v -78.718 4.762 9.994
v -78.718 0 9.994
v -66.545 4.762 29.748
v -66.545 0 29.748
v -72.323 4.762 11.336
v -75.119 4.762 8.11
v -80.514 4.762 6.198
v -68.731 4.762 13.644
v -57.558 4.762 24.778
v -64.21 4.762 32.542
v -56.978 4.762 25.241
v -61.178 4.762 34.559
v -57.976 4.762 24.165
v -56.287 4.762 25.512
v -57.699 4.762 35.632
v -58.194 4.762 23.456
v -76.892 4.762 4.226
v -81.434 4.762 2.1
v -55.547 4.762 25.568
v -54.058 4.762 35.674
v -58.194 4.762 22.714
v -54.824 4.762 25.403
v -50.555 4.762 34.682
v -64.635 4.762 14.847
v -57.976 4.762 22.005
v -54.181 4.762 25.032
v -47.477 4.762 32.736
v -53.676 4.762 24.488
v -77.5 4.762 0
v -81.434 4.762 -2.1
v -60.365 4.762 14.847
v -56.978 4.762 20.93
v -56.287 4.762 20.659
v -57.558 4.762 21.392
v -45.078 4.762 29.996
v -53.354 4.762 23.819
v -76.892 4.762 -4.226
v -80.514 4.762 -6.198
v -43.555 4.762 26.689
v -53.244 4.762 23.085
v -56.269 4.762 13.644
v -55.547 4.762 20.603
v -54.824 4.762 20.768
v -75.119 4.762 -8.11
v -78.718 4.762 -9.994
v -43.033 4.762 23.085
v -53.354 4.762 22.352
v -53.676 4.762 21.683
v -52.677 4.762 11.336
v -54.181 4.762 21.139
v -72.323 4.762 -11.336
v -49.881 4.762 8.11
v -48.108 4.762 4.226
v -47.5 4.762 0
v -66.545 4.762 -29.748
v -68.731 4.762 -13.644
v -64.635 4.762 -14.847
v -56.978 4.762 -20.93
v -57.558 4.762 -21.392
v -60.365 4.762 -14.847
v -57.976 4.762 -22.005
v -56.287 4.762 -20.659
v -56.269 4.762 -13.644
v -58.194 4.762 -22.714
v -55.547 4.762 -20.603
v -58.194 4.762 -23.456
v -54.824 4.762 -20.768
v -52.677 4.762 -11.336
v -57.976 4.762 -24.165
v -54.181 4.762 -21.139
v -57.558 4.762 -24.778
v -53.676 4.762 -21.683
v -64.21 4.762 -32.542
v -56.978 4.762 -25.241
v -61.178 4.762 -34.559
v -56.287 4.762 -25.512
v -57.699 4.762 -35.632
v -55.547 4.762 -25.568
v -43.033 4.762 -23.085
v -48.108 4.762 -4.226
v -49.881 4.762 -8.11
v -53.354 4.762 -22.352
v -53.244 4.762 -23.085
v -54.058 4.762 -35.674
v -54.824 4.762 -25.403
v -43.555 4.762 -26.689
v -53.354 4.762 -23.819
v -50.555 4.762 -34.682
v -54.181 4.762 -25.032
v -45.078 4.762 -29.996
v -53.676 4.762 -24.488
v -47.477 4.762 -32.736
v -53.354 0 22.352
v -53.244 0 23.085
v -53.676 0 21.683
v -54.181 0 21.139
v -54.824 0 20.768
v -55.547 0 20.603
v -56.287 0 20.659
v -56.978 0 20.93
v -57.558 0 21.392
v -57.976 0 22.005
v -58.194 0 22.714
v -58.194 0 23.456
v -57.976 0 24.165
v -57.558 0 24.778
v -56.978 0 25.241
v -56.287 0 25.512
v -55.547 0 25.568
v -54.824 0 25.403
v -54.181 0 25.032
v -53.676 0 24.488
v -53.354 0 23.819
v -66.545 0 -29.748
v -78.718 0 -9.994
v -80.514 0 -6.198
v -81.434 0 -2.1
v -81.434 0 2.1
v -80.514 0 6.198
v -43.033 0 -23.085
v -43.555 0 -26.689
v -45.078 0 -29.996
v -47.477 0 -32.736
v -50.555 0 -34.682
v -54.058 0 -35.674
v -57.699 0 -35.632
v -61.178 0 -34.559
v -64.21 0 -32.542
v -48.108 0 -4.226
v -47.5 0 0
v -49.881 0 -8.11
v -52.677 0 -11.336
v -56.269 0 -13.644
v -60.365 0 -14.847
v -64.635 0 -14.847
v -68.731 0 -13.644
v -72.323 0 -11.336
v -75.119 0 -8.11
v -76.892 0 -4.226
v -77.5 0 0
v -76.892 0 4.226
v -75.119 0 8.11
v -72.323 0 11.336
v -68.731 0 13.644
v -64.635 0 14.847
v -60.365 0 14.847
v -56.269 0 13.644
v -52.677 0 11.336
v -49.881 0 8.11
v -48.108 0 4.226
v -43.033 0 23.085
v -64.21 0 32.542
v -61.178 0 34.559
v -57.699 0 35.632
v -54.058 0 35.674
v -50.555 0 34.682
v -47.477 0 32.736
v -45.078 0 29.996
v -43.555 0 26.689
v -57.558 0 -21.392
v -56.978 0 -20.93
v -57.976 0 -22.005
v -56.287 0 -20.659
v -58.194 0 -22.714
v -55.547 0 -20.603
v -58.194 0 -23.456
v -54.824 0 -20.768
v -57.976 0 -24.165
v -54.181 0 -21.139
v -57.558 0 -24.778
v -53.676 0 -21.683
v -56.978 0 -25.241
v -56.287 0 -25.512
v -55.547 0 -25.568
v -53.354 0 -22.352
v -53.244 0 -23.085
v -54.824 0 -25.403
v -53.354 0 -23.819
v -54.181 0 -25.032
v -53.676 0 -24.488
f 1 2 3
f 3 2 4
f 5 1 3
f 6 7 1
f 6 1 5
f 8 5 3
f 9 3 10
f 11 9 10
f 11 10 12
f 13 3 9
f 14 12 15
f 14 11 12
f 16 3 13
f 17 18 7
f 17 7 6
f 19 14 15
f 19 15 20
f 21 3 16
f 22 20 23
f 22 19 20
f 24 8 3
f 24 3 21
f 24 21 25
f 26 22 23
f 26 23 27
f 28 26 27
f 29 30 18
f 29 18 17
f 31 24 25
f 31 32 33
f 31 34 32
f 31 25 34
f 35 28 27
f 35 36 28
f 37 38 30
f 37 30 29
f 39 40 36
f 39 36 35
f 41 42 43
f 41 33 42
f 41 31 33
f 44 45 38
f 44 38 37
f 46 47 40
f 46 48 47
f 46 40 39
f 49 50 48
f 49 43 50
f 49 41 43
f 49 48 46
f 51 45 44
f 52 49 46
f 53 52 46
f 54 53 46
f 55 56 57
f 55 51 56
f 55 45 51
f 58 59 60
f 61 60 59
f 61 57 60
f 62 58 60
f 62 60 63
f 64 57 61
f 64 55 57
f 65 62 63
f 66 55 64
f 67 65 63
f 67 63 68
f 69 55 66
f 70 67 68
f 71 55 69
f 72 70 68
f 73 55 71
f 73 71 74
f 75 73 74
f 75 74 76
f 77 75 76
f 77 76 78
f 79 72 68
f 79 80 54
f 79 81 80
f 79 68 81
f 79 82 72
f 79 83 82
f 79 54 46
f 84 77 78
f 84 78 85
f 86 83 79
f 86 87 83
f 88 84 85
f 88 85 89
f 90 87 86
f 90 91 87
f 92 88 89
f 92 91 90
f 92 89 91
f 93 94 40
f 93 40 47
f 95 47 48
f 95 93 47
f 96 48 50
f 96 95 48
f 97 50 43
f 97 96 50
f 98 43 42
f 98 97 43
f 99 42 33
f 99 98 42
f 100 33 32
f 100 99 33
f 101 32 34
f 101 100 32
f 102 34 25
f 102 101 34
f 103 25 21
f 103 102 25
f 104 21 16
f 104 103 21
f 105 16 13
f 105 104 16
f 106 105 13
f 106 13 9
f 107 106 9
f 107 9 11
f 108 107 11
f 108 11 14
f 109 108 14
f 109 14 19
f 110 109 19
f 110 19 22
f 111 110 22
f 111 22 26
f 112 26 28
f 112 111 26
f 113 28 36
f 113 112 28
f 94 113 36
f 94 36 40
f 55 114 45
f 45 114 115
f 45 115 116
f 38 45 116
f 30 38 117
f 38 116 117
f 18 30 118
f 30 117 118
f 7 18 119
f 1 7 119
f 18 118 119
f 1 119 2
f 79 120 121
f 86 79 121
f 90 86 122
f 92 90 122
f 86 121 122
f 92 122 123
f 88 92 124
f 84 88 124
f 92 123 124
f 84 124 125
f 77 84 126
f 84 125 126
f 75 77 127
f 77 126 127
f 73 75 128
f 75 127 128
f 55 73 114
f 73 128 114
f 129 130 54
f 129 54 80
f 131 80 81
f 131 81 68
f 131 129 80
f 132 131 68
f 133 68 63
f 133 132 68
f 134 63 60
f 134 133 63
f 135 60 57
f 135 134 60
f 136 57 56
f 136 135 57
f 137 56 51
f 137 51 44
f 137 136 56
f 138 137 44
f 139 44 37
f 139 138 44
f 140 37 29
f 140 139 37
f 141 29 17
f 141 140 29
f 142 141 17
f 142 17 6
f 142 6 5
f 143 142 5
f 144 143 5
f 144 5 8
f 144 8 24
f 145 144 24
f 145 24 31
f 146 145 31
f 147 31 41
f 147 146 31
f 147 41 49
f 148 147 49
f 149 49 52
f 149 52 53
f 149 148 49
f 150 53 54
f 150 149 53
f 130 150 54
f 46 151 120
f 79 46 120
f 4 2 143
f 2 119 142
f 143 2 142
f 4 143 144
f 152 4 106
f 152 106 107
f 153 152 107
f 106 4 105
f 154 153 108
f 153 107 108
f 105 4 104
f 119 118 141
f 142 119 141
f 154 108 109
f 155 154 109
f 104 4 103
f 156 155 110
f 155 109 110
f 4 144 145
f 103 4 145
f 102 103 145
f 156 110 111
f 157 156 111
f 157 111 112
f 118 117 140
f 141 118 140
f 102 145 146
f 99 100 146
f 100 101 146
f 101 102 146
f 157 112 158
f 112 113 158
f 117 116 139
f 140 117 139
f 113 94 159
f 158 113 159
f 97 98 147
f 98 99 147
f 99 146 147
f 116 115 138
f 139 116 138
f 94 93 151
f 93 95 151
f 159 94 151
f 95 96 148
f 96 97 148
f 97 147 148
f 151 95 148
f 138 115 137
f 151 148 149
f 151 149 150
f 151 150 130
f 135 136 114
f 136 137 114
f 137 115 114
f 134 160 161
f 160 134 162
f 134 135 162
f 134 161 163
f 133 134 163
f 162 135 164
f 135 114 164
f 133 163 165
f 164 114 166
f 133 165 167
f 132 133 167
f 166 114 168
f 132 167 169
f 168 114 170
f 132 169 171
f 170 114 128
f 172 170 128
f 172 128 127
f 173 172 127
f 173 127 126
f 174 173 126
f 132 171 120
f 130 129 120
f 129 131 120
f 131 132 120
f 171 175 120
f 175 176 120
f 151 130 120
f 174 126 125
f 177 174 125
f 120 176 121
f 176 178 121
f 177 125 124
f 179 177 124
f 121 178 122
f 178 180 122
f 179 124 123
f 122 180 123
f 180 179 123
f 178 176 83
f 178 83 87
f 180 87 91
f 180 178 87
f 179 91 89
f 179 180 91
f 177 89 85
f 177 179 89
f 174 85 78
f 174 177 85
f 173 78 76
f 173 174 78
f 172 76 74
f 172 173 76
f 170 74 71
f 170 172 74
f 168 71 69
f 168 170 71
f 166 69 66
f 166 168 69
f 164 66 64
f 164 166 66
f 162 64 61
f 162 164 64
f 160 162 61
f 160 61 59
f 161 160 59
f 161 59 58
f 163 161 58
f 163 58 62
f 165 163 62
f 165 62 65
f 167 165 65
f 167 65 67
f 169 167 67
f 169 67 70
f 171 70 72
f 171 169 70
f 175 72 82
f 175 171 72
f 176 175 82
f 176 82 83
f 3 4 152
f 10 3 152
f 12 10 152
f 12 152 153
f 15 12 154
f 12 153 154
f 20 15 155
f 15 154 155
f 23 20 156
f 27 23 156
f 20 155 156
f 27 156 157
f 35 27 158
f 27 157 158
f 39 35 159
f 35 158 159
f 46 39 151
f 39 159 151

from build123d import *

# Parameters (mm, degrees)
SKETCH1_R           = 15
SKETCH1_R_2         = 2.4892
BOSS_EXTRUDE1_DEPTH = 4.7625


with BuildPart() as part:
    # Sketch1 → Boss-Extrude1 (new body)
    with BuildSketch(Plane(origin=(0, 0, 0), x_dir=(1, 0, 0), z_dir=(0, 1, 0))):
        with BuildLine():
            Line((-66.545030839, 29.74801255), (-78.71799706, 9.993951739))
            ThreePointArc((-78.71799706, 9.993951739), (-81.55, 0), (-78.71799706, -9.993951739))
            Line((-78.71799706, -9.993951739), (-66.545030839, -29.74801255))
            ThreePointArc((-66.545030839, -29.74801255), (-52.270546345, -35.304264568), (-43.033032799, -23.085378057))
            Line((-43.033032799, -23.085378057), (-43.033032799, 23.085378057))
            ThreePointArc((-43.033032799, 23.085378057), (-52.270546345, 35.304264568), (-66.545030839, 29.74801255))
        make_face()
        with Locations((-62.5, 0)):
            Circle(SKETCH1_R, mode=Mode.SUBTRACT)
        with Locations((-55.733032799, 23.085378057)):
            Circle(SKETCH1_R_2, mode=Mode.SUBTRACT)
        with Locations((-55.733032799, -23.085378057)):
            Circle(SKETCH1_R_2, mode=Mode.SUBTRACT)
    extrude(amount=BOSS_EXTRUDE1_DEPTH)


solid = part.part
